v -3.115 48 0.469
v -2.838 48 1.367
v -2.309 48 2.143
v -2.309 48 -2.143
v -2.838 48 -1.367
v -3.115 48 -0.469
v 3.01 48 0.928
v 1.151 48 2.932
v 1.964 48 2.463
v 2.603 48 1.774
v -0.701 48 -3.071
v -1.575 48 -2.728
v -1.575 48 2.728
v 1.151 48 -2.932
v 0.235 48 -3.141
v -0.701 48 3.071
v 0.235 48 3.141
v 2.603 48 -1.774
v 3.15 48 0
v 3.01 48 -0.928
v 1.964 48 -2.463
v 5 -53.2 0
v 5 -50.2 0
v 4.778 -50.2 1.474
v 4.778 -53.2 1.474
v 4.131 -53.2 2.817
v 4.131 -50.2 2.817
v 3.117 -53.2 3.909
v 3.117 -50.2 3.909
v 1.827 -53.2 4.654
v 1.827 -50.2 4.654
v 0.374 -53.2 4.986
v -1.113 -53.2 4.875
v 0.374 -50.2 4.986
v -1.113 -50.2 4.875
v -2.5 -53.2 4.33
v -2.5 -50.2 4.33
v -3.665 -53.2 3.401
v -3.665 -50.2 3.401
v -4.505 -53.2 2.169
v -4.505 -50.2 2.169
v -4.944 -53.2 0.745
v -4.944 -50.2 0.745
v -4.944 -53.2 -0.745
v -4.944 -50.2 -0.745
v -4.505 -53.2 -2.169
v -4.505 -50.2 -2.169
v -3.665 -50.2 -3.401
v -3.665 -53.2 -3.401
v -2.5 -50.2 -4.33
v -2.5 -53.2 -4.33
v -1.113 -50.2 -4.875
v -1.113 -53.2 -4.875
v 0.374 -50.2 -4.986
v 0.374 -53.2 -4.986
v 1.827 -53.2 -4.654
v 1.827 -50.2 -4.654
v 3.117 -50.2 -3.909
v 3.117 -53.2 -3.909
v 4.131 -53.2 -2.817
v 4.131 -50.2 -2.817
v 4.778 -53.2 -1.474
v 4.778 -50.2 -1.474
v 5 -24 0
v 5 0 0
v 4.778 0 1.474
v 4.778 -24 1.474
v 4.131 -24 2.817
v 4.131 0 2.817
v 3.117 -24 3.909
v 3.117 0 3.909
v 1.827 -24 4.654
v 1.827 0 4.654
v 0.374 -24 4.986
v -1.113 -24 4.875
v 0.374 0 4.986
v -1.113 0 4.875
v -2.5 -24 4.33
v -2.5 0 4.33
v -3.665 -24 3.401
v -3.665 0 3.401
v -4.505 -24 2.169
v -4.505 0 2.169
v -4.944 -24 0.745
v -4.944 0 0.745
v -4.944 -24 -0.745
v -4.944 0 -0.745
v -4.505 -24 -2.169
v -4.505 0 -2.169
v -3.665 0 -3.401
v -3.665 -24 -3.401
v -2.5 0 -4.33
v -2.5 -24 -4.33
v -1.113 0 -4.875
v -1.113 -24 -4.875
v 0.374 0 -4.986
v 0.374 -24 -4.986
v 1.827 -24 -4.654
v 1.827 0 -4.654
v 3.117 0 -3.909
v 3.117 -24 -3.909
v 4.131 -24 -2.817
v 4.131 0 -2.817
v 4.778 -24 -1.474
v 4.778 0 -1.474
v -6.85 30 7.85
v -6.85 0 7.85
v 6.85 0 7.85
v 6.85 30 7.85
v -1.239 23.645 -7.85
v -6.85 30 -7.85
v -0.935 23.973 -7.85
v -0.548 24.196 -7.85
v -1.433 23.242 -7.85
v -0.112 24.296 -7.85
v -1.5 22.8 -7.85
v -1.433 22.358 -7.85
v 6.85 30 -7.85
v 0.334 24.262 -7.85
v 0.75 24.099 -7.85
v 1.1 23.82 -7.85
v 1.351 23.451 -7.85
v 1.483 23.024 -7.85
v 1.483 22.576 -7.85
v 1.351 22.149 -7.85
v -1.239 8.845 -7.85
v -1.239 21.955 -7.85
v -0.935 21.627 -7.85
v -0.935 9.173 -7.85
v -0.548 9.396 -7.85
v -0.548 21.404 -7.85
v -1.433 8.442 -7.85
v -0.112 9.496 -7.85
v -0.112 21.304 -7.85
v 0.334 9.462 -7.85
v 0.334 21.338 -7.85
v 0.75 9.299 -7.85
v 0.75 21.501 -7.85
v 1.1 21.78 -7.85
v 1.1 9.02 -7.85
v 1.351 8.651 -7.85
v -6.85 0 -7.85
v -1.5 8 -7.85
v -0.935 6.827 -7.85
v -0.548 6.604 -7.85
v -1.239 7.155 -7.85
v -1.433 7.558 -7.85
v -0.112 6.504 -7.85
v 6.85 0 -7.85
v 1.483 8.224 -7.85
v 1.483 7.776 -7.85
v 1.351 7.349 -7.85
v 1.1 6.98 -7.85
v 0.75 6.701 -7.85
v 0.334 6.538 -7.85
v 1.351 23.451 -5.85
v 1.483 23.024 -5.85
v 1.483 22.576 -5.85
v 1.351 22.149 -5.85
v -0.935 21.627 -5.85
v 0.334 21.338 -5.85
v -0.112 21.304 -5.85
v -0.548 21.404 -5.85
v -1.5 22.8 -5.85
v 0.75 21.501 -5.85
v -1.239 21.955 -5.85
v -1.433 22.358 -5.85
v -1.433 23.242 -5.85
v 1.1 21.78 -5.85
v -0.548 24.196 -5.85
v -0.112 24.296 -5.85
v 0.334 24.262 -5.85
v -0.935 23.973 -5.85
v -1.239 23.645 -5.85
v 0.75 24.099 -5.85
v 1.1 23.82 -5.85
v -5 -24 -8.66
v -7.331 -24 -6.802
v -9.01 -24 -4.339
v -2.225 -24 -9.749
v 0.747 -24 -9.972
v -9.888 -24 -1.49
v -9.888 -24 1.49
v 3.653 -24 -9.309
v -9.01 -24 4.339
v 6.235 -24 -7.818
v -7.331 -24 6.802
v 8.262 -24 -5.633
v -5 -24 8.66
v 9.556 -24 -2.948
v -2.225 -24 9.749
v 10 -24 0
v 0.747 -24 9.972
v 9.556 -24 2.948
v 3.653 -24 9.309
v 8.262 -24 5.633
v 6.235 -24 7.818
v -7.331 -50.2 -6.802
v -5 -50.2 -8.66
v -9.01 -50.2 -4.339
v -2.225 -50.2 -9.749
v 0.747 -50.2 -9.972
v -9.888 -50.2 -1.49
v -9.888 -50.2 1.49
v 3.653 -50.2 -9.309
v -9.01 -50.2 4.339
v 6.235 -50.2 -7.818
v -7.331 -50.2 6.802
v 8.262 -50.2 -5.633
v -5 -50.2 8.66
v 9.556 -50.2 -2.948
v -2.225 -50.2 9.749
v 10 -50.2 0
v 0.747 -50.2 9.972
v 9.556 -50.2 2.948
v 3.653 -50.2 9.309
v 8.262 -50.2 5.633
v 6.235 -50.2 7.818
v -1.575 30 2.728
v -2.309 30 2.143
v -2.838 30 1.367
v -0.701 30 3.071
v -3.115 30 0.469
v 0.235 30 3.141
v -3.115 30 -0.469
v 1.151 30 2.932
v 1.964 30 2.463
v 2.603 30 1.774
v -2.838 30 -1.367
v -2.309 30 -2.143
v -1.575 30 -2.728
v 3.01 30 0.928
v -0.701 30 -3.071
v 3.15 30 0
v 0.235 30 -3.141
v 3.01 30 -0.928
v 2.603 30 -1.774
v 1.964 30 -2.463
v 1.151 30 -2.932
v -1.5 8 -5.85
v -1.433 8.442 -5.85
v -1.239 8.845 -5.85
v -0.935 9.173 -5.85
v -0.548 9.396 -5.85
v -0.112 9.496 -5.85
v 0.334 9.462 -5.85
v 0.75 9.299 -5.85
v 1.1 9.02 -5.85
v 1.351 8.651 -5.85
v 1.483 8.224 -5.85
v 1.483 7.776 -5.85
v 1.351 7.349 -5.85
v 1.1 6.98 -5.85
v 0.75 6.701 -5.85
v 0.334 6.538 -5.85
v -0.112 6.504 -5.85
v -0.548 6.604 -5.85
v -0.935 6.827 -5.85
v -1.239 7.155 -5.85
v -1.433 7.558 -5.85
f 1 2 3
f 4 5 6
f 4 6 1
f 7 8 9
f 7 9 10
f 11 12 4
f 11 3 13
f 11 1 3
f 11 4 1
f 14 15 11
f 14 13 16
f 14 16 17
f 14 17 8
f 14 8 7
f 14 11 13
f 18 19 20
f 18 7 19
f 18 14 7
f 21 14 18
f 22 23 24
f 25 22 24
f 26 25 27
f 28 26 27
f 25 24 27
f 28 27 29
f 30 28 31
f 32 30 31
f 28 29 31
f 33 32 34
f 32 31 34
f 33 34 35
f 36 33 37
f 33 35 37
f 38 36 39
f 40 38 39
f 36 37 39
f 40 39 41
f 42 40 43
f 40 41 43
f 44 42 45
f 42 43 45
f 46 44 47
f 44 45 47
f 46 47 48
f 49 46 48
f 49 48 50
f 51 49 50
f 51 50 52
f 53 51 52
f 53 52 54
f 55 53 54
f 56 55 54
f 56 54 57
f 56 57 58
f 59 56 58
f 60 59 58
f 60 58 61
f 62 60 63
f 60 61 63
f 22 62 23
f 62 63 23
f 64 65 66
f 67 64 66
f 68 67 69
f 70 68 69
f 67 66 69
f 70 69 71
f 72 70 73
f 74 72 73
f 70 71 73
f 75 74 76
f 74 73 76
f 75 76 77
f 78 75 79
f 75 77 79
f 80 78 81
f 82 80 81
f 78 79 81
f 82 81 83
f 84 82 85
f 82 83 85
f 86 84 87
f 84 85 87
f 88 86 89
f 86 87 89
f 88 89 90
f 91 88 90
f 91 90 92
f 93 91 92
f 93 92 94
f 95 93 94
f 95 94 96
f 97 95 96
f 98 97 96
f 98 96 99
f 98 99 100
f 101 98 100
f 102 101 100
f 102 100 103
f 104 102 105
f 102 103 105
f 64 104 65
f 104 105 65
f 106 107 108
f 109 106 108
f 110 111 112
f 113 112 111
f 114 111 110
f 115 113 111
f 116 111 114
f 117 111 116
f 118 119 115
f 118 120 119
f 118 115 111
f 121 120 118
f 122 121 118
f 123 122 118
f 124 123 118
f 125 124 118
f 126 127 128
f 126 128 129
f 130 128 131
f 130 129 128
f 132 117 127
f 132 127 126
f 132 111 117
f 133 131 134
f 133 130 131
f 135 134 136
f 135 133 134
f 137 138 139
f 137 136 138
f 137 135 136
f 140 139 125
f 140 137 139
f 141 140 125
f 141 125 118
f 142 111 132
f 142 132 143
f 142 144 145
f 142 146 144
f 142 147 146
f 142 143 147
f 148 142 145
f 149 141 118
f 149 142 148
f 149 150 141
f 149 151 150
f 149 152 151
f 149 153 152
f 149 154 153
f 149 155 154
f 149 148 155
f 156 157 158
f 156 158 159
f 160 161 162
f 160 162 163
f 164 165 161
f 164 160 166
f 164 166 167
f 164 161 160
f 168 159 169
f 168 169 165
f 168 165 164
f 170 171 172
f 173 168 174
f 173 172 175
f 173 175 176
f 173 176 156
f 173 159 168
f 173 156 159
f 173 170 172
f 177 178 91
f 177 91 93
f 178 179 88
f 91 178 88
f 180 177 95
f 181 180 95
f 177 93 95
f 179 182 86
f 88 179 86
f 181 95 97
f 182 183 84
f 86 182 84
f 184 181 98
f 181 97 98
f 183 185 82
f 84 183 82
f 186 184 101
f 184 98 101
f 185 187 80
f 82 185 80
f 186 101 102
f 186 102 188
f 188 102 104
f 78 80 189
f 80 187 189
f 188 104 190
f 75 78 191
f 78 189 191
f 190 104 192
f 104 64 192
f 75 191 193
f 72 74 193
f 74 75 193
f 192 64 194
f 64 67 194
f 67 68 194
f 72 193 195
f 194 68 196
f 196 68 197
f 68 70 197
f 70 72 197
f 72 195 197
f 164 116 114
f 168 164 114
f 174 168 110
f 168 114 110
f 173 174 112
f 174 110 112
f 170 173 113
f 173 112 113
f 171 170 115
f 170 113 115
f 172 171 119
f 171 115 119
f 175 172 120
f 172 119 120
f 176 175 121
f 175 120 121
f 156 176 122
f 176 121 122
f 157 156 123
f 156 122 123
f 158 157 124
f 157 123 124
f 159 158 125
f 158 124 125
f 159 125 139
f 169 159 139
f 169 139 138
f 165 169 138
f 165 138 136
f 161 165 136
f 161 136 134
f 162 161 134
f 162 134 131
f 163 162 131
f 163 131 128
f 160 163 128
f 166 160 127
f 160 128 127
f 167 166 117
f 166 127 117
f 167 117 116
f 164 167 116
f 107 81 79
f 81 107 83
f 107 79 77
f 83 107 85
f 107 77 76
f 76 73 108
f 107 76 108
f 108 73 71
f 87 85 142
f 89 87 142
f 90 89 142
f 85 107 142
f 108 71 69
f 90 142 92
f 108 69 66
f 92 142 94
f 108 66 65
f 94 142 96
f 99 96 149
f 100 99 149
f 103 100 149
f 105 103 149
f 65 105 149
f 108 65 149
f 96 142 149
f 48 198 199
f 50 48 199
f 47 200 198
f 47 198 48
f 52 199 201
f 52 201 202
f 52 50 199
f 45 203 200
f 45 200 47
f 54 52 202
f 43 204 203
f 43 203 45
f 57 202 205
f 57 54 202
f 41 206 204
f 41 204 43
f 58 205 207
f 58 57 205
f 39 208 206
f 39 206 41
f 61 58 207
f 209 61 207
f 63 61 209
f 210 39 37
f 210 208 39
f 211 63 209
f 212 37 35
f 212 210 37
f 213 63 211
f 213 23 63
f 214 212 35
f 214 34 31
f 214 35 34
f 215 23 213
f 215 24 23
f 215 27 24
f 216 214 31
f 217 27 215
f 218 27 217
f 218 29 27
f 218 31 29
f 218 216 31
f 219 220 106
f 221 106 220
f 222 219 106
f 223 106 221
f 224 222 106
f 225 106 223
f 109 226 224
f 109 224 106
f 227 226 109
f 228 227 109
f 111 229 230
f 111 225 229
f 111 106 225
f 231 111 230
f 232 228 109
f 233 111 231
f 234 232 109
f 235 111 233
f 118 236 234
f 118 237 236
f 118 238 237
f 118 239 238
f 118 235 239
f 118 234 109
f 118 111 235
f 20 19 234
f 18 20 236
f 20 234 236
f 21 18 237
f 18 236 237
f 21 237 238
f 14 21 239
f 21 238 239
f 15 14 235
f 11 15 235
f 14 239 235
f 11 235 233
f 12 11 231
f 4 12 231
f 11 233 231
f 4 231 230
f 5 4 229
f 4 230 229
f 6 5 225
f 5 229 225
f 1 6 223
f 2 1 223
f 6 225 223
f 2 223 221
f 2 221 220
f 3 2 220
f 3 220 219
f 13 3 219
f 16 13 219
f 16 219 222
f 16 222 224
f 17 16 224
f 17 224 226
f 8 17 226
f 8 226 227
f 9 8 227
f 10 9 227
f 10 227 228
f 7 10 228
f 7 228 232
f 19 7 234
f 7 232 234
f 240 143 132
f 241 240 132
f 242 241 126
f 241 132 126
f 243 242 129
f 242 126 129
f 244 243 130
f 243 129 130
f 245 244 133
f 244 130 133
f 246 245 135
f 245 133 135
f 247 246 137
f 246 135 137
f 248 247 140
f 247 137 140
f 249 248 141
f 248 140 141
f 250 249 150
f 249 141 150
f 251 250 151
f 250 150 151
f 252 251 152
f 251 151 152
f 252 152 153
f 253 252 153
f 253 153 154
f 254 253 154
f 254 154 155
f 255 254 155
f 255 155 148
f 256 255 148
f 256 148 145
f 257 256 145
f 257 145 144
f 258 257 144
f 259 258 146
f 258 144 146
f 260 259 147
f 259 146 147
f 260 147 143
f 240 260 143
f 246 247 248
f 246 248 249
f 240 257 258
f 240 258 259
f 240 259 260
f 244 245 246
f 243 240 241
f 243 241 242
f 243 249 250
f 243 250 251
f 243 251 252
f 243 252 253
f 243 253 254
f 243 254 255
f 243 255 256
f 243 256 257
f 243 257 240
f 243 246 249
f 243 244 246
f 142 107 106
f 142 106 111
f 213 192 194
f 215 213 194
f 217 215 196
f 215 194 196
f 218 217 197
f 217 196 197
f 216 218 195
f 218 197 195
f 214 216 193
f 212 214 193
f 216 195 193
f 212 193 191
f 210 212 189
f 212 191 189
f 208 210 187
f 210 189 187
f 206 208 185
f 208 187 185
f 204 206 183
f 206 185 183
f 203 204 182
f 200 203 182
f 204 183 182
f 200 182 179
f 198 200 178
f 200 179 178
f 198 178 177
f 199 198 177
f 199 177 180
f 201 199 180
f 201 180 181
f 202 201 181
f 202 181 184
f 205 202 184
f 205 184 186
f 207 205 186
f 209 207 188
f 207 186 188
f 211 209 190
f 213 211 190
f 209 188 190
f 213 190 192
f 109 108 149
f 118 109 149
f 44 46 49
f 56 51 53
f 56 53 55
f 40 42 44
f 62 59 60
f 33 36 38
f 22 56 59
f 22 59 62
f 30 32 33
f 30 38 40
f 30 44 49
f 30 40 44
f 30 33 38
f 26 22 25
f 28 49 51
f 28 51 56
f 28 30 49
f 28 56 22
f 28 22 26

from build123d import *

# Parameters (mm, degrees)
SKETCH1_W           = 13.7
SKETCH1_H           = 15.7
BOSS_EXTRUDE1_DEPTH = 30
SKETCH2_R           = 5
BOSS_EXTRUDE2_DEPTH = 24
SKETCH3_R           = 10
BOSS_EXTRUDE3_DEPTH = 26.2
SKETCH4_R           = 5
BOSS_EXTRUDE4_DEPTH = 3
SKETCH5_R           = 3.15
BOSS_EXTRUDE5_DEPTH = 18
SKETCH8_R           = 1.5
CUT_EXTRUDE1_DEPTH  = 2


with BuildPart() as part:
    # Sketch1 → Boss-Extrude1 (new body)
    with BuildSketch(Plane(origin=(0, 0, 0), x_dir=(1, 0, 0), z_dir=(0, 1, 0))):
        Rectangle(SKETCH1_W, SKETCH1_H)
    extrude(amount=BOSS_EXTRUDE1_DEPTH)

    # Sketch2 → Boss-Extrude2 (add)
    with BuildSketch(Plane.XZ):
        Circle(SKETCH2_R)
    extrude(amount=BOSS_EXTRUDE2_DEPTH)

    # Sketch3 → Boss-Extrude3 (add)
    with BuildSketch(Plane.XZ.offset(24)):
        Circle(SKETCH3_R)
    extrude(amount=BOSS_EXTRUDE3_DEPTH)

    # Sketch4 → Boss-Extrude4 (add)
    with BuildSketch(Plane.XZ.offset(50.2)):
        Circle(SKETCH4_R)
    extrude(amount=BOSS_EXTRUDE4_DEPTH)

    # Sketch5 → Boss-Extrude5 (add)
    with BuildSketch(Plane(origin=(0, 30, 0), x_dir=(1, 0, 0), z_dir=(0, 1, 0))):
        Circle(SKETCH5_R)
    extrude(amount=BOSS_EXTRUDE5_DEPTH)

    # Sketch8 → Cut-Extrude1 (cut)
    with BuildSketch(Plane(origin=(0, 0, -7.85), x_dir=(-1, 0, 0), z_dir=(0, 0, -1))):
        with Locations((0, 8)):
            Circle(SKETCH8_R)
        with Locations((0, 22.8)):
            Circle(SKETCH8_R)
    extrude(amount=-CUT_EXTRUDE1_DEPTH, mode=Mode.SUBTRACT)


solid = part.part
